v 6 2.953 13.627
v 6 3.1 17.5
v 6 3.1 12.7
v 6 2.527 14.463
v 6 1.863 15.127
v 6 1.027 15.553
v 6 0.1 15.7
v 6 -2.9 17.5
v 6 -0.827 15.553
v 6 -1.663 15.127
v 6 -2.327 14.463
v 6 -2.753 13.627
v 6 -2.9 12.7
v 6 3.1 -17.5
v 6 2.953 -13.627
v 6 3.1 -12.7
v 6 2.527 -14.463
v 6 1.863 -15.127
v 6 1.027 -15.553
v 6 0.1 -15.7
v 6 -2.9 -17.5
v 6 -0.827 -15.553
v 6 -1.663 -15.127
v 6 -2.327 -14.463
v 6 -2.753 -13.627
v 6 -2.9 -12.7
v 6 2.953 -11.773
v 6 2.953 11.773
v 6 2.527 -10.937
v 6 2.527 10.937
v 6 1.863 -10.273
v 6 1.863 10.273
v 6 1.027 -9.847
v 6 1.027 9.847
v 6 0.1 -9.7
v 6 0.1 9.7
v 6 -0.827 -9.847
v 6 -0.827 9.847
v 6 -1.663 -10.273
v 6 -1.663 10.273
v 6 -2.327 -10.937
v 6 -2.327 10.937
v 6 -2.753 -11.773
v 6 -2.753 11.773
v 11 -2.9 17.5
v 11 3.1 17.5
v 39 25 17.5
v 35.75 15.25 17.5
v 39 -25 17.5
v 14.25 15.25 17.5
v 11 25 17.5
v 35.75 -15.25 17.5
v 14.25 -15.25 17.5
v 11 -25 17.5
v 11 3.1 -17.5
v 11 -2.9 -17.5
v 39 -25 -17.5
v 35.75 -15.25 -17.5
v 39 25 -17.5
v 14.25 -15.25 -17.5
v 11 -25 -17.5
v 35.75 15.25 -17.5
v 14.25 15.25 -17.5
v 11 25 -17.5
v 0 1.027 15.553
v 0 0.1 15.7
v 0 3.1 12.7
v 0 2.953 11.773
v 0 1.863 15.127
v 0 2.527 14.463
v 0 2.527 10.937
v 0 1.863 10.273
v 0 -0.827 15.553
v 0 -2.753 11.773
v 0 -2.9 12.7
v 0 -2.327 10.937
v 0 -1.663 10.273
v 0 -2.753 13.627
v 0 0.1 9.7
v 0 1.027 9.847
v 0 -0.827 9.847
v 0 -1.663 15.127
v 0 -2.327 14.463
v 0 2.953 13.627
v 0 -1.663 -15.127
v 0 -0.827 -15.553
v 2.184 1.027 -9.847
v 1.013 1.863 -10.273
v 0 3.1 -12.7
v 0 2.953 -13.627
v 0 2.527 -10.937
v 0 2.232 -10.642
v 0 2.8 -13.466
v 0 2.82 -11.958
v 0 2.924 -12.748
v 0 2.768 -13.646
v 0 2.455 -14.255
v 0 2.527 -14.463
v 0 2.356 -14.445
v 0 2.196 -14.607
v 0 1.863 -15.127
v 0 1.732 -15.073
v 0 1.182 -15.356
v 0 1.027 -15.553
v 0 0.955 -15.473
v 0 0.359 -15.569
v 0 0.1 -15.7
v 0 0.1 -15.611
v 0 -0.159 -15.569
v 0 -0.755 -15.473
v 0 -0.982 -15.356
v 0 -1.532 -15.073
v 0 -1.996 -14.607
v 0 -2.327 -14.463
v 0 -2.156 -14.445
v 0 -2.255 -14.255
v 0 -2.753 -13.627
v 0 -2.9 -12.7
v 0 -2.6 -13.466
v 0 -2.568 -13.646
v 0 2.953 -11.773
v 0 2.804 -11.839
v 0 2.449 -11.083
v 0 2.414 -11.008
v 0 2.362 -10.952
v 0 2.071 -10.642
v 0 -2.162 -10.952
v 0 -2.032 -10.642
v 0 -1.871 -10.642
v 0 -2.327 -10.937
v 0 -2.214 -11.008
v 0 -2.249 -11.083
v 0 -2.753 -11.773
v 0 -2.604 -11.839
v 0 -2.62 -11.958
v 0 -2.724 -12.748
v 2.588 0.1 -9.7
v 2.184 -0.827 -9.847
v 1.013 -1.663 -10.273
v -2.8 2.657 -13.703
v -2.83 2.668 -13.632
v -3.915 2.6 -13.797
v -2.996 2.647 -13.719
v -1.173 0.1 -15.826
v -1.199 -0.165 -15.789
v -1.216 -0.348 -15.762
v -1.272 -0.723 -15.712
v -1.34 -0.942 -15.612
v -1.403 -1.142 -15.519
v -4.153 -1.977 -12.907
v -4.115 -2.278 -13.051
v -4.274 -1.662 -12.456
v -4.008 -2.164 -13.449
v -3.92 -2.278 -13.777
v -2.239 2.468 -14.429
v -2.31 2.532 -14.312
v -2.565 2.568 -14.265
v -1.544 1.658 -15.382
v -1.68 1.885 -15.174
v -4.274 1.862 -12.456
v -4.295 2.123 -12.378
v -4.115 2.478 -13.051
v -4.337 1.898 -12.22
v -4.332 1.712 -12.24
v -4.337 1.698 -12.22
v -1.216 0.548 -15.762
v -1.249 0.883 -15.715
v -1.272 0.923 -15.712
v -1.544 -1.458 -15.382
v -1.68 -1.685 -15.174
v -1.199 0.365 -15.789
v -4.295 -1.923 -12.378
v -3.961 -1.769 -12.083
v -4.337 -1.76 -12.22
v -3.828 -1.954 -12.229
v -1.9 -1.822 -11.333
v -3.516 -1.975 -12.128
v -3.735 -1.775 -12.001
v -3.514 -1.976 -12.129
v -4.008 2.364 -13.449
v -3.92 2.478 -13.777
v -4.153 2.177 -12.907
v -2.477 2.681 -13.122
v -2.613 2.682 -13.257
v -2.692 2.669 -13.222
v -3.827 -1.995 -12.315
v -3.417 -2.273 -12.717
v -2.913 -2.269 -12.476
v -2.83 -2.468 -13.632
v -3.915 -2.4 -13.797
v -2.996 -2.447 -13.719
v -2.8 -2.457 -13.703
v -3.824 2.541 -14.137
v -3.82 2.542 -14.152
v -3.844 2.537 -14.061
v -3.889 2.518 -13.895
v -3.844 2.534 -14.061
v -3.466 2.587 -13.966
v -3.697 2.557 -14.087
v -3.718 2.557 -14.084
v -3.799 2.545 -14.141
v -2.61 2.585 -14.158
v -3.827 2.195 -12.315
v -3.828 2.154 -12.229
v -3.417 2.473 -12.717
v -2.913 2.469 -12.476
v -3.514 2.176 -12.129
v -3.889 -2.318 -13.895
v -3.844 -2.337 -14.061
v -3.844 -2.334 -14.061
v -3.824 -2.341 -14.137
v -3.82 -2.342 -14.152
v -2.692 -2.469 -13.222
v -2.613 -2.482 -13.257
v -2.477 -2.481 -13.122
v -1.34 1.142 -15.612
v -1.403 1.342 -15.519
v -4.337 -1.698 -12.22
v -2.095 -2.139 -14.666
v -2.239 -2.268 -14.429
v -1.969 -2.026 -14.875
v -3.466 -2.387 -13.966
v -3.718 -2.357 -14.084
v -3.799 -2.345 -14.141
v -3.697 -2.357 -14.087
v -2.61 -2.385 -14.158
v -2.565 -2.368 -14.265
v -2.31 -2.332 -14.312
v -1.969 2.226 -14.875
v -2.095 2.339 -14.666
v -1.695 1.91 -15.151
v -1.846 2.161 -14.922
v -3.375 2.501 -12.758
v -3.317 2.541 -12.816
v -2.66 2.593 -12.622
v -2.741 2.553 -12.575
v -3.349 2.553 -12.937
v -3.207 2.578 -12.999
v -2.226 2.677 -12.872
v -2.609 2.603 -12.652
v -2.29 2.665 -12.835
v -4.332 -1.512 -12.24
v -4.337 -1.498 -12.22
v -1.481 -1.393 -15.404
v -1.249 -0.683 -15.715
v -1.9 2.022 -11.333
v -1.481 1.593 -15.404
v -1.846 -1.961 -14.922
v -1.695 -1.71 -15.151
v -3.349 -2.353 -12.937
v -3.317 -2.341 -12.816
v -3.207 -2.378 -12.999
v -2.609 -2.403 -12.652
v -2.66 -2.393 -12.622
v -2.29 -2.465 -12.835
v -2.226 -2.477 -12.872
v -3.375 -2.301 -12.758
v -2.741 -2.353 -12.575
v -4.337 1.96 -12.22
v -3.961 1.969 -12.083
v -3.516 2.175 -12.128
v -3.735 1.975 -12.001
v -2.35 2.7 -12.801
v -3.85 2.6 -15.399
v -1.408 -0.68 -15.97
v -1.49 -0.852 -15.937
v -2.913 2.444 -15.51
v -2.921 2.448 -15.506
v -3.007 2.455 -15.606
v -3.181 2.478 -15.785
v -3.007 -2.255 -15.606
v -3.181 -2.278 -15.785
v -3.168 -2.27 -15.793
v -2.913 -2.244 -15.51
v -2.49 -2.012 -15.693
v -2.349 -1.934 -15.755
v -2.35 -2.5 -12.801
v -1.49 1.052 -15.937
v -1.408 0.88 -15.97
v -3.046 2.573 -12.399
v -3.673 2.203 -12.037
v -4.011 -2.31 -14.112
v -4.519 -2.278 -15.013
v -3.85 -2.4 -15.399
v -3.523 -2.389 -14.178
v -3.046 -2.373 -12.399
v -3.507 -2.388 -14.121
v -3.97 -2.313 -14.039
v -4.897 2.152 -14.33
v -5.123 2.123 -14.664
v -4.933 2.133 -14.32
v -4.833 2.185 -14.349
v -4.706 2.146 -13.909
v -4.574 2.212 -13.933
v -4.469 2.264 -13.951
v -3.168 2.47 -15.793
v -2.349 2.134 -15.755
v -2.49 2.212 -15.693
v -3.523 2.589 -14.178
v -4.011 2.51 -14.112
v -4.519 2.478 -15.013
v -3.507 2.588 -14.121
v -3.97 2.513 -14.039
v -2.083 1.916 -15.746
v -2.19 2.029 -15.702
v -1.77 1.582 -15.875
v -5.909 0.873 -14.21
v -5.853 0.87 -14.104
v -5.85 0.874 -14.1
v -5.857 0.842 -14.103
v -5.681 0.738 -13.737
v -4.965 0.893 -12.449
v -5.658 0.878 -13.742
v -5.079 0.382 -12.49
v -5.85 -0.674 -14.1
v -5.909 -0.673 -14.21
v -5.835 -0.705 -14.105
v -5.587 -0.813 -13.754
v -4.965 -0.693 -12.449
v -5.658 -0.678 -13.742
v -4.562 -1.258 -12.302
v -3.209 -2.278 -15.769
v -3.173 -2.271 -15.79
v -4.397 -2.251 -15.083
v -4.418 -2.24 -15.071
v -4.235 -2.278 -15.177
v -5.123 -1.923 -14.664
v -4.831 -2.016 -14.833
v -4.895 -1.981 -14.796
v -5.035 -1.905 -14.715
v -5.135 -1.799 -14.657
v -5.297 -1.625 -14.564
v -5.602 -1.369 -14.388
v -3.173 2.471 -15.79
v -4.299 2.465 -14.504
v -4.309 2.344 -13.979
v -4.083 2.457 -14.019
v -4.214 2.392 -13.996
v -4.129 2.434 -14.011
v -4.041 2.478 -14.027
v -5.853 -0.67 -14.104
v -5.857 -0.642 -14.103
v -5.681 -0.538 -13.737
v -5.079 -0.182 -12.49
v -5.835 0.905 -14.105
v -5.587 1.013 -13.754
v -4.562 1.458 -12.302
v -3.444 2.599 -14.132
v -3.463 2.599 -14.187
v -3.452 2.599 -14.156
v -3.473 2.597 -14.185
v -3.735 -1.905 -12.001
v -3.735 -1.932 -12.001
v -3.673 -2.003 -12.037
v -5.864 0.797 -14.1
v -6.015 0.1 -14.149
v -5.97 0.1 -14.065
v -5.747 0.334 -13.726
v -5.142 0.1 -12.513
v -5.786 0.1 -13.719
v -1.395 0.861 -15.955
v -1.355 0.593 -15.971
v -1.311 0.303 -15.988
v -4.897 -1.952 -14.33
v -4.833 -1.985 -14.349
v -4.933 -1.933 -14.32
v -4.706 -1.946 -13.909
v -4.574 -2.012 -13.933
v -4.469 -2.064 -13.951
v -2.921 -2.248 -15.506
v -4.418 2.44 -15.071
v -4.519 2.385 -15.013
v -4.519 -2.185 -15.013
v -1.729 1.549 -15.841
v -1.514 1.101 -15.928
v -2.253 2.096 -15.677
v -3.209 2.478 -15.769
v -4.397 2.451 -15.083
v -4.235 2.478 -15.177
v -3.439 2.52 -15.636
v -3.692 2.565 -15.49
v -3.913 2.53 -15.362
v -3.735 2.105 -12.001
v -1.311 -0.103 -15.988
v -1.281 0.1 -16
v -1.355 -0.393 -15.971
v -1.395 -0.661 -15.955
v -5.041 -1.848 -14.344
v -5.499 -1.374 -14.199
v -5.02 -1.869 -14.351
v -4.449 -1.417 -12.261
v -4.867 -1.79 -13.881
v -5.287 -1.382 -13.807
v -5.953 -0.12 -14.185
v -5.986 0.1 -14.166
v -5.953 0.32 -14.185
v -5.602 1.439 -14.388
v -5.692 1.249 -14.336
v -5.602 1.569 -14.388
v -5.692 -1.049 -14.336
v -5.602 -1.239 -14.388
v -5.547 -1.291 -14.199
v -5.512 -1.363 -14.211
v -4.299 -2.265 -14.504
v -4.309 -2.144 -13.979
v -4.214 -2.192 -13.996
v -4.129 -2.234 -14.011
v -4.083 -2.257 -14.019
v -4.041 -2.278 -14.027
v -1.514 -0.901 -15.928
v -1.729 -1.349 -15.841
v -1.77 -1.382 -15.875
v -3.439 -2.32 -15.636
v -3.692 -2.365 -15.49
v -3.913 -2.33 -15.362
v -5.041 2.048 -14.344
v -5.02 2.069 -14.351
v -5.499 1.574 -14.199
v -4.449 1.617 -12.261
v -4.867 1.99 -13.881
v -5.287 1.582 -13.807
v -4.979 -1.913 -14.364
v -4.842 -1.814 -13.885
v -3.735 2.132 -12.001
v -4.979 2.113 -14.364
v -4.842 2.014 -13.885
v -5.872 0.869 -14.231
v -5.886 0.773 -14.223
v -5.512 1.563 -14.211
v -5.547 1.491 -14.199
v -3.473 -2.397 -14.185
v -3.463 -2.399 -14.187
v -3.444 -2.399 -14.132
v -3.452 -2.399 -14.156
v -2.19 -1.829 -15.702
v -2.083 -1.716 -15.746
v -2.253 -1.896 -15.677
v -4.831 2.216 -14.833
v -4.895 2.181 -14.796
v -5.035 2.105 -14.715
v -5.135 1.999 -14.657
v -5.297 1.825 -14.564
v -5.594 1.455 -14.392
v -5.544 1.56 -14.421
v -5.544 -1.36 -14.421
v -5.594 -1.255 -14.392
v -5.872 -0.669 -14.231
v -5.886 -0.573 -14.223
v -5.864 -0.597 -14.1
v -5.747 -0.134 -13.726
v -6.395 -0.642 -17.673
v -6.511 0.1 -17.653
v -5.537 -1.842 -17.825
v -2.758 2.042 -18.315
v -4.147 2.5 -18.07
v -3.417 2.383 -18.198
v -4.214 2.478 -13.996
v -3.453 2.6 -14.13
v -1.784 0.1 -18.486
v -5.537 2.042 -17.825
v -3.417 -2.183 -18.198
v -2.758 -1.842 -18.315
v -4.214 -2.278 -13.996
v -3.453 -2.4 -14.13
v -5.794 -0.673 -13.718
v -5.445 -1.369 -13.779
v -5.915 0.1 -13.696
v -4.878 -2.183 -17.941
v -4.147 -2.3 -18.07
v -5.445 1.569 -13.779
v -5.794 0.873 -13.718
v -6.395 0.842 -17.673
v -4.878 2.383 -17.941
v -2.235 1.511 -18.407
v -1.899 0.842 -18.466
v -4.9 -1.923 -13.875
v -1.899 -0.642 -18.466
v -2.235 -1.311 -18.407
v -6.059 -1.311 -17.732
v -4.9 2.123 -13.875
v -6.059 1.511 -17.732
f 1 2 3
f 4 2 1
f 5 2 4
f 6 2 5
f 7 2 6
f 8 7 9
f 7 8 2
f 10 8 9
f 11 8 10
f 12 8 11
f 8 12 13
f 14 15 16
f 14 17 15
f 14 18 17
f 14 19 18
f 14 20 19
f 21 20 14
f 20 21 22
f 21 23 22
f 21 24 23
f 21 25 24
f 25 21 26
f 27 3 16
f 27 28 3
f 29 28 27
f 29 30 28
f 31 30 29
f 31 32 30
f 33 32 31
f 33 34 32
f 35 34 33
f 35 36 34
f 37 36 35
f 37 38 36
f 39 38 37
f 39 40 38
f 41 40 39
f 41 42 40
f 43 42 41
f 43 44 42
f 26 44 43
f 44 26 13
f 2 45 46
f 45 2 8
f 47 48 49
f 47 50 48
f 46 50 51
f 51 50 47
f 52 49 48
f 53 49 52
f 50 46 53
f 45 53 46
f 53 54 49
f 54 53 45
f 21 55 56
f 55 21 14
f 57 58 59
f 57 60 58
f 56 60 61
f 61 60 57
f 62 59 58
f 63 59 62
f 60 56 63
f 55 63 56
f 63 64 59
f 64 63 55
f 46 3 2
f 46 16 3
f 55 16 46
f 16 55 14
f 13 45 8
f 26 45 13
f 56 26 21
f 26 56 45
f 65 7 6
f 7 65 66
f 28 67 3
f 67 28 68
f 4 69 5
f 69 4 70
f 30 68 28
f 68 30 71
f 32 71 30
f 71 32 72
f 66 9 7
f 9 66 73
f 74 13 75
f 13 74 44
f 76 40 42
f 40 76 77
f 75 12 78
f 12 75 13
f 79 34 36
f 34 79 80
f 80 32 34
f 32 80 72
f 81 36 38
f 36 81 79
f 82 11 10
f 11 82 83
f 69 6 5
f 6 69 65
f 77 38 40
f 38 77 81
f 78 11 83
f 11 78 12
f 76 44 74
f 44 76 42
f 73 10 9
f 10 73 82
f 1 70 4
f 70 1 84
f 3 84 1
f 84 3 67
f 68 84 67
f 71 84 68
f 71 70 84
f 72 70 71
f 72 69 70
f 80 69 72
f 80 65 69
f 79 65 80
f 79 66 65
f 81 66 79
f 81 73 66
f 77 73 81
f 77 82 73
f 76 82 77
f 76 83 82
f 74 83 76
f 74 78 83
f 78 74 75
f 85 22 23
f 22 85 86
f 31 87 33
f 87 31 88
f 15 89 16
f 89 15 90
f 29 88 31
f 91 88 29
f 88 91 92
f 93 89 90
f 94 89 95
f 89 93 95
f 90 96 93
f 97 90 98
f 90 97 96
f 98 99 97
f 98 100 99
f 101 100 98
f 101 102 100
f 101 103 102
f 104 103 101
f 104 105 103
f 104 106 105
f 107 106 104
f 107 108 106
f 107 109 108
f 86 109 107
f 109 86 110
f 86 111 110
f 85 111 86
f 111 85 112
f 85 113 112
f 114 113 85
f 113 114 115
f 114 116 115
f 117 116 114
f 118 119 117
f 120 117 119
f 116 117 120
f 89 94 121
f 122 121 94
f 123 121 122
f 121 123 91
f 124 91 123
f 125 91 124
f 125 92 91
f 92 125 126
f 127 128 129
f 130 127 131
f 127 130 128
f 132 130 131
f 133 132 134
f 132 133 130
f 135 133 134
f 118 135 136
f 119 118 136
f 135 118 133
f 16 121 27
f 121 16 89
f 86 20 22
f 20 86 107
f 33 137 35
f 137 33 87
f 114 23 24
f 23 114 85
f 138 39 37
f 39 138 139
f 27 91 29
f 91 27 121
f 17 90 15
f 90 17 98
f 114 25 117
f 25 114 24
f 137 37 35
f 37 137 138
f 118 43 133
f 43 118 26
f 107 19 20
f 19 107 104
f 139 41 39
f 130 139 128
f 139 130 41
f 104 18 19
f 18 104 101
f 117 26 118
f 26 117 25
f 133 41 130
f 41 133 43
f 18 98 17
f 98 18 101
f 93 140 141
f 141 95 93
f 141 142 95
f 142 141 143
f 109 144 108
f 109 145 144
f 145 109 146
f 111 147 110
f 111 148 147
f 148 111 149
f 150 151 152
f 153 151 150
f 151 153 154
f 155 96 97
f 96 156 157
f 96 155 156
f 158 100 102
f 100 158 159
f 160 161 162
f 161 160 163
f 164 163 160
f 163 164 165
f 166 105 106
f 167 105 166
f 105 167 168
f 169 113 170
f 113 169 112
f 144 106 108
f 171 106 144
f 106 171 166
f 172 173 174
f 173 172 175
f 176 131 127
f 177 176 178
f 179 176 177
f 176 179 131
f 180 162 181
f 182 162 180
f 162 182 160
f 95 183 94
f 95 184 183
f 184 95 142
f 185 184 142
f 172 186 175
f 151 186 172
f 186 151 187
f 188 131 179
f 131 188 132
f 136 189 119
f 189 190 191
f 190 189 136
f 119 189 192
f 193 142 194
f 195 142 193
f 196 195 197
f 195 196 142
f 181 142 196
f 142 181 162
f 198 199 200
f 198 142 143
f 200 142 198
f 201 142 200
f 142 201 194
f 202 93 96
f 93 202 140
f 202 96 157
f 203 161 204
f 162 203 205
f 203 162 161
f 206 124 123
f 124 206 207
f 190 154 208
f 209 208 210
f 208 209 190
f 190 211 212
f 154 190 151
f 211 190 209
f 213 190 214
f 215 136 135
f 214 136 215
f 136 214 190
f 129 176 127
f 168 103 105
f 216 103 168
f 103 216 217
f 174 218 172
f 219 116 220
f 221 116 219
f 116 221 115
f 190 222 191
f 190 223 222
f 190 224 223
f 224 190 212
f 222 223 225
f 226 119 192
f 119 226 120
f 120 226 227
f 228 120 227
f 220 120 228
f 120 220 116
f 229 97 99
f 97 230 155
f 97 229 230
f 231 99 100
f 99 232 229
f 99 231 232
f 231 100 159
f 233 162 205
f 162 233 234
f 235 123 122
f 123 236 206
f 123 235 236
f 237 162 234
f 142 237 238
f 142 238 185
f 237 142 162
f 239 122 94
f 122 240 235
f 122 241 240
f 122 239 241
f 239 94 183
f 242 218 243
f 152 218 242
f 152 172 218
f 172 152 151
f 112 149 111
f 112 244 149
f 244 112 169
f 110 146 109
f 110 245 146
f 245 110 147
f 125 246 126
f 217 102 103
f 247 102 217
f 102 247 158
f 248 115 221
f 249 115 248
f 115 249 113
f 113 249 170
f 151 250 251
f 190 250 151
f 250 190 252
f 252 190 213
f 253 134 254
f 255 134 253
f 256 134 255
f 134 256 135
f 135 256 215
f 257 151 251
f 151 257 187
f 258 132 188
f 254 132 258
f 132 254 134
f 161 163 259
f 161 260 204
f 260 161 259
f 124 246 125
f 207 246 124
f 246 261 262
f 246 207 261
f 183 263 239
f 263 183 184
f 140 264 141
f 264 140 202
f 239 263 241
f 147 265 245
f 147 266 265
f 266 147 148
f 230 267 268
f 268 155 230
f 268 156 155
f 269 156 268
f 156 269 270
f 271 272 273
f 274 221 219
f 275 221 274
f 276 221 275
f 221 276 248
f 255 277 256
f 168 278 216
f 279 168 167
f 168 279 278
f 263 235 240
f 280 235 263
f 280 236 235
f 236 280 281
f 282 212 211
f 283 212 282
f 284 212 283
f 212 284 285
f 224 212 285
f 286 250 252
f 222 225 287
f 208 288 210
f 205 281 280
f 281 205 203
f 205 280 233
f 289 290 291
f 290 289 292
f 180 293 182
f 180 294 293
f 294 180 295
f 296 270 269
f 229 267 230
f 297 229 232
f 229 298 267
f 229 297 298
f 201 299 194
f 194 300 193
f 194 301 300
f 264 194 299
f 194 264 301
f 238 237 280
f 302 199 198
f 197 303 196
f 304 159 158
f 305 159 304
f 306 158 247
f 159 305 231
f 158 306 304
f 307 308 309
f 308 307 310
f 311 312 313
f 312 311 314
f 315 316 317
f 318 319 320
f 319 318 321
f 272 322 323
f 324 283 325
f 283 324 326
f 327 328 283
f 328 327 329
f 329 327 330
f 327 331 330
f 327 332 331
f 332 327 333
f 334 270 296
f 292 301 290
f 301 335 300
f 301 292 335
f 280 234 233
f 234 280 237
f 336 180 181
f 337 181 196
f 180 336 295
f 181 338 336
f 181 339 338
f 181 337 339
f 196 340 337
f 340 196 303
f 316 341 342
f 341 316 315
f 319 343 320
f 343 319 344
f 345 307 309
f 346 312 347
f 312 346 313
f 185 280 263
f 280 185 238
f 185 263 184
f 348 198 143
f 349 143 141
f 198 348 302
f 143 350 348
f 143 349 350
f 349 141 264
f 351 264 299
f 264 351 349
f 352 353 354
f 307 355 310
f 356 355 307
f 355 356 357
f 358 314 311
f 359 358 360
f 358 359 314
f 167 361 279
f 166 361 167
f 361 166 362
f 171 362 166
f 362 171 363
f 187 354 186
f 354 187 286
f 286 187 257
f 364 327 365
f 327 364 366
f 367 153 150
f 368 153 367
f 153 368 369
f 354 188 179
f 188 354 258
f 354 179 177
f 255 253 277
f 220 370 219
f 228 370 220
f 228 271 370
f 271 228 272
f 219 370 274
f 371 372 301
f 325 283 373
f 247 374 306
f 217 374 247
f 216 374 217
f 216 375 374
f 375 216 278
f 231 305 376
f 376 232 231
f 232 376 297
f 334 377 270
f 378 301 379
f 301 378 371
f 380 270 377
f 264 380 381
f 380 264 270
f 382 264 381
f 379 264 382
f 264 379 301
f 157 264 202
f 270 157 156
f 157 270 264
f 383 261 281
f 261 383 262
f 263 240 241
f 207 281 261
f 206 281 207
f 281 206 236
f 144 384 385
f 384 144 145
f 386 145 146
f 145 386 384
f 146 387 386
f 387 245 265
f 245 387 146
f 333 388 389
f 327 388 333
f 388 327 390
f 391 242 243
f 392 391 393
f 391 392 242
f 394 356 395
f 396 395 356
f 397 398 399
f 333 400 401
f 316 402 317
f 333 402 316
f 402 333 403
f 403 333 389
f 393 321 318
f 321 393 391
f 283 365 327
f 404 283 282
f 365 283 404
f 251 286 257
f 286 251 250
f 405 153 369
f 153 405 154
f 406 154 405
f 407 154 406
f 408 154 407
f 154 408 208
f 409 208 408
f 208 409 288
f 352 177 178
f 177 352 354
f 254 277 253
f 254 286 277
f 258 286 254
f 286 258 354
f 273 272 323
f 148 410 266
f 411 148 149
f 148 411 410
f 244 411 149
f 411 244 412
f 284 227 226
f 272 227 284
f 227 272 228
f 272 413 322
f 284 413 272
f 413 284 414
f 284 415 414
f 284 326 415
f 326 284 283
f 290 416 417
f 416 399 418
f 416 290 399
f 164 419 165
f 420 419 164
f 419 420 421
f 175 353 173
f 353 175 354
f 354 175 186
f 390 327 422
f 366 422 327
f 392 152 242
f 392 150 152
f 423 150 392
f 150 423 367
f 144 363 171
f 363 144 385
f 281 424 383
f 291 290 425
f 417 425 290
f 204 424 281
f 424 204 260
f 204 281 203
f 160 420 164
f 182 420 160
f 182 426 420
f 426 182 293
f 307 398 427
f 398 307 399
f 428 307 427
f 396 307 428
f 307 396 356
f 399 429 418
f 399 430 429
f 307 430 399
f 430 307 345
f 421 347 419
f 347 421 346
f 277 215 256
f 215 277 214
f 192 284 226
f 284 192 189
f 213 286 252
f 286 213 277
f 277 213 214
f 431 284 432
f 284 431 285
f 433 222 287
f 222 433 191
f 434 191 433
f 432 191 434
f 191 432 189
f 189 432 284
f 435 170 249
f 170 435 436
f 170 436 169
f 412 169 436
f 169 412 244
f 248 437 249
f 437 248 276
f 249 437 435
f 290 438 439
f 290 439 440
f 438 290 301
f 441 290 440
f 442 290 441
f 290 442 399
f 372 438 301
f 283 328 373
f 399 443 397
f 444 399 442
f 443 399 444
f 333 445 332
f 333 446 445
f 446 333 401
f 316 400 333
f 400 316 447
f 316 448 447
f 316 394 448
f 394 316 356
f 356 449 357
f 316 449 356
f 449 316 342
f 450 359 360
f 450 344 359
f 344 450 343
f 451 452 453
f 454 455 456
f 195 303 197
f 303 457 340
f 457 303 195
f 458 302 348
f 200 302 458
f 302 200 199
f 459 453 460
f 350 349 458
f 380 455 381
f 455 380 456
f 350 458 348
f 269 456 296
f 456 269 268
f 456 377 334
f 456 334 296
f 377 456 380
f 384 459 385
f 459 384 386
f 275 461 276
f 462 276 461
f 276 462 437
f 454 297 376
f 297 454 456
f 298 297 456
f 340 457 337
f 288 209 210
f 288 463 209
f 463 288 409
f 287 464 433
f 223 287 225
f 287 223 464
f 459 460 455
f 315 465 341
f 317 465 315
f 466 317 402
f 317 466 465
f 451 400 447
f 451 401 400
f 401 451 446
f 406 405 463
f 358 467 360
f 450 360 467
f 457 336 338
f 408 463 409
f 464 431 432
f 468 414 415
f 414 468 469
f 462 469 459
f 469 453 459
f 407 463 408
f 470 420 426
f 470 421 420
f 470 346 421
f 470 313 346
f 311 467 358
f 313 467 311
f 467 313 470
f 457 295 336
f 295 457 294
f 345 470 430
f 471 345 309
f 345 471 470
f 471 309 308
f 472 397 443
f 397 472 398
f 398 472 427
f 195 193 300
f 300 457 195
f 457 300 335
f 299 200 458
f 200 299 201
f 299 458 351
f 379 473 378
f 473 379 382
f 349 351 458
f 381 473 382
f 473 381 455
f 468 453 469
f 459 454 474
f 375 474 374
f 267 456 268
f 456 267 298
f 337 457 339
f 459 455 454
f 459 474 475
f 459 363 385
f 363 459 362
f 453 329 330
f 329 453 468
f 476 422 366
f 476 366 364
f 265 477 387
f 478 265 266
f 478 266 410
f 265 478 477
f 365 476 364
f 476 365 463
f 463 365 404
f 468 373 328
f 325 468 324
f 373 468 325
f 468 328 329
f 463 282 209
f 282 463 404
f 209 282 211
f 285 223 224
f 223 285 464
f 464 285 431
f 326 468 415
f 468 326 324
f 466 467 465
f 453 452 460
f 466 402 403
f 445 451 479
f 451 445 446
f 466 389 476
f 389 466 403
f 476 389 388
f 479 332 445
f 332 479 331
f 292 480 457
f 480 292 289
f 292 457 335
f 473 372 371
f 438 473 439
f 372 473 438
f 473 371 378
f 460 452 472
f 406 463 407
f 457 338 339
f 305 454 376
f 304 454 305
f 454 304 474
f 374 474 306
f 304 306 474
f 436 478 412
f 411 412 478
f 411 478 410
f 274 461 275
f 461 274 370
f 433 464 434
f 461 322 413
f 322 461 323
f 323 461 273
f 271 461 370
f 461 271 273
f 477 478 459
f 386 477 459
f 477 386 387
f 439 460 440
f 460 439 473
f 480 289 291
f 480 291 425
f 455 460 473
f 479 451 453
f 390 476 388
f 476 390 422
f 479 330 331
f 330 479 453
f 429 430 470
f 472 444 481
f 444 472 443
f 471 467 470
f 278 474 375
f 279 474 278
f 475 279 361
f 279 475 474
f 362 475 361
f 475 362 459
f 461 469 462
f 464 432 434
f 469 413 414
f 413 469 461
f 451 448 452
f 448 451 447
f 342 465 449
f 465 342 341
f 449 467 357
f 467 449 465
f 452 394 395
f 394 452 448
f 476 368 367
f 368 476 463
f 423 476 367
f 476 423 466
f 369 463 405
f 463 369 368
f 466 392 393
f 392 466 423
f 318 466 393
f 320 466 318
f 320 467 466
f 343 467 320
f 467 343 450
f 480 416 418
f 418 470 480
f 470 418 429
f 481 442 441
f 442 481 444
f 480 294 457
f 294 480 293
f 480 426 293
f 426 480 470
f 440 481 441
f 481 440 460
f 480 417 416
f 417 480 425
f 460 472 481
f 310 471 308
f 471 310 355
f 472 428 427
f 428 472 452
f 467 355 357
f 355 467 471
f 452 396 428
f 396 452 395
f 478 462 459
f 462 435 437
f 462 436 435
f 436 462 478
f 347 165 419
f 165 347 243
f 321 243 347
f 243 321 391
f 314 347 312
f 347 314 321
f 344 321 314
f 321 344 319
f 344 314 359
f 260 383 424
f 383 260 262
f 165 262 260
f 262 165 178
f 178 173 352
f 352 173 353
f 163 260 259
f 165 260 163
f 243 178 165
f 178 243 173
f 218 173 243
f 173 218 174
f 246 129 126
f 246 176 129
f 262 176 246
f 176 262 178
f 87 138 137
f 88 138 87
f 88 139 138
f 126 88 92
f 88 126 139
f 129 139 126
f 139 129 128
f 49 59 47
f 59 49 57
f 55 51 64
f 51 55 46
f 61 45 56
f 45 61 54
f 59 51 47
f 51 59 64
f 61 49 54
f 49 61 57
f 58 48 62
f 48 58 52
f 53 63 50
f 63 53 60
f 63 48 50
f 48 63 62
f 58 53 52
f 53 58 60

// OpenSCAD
$fn=20;
rad=5.6;

//%import("/home/paul/Downloads/10mmHook.stl");
module peghookbase(thickness) {
    difference(){
        union(){

//cylinder behind hook
translate([-6 - thickness/2,0,0])rotate([90,0,0])cube([thickness,6,35], center=true);
translate([-4,-12.7,0])rotate([0,90,0])cylinder(r=3,h=8, center=true);
translate([-4,12.7,0])rotate([0,90,0])cylinder(r=3,h=8, center=true);
translate([1.5,13.15,0])rotate([0,90,15])cylinder(r1=2.9,r2=2.5,h=5, center=true);
translate([3.1,14.1,0])rotate([0,90,60])cylinder(r1=2.6,r2=2.5,h=3,center=true);
//hooks
   translate([3.8,16.1,0])rotate([0,90,80])cylinder(r1=2.5,r2=2.4,h=4,center=true);}
   rotate([0,0,20])translate([6,4,0])cube(12, center=true);}
}



//translate([0,-38.1,0])rotate([90, 180,0])peghookbase(7.5);
translate([0,0.1,0])rotate([90, 180,0])peghookbase(7.5);
//base
translate([25,0,0])difference(){
    cube([28,50,35], center=true);
    
    
translate([0,0,0]) cube([21.5,30.5,36], center = true);
/*slots
   
    translate([-10,0,0]) cube([12.6,26,36], center = true);
    #translate([10,0,0]) cube([12.6,26,36], center = true);
    translate([0,90,0]) cube([12.6,26,36], center = true);
    translate([0,-45,0]) cube([12.6,26,36], center = true);
    translate([0,-90,0]) cube([12.6,26,36], center = true);
*/
//holes
    /*translate([0,0,0])cylinder(r=rad, h=36, center=true);
    translate([0,15,0])cylinder(r=rad, h=36, center=true);
    translate([0,30,0])cylinder(r=rad, h=36, center=true);
    translate([0,-30,0])cylinder(r=rad, h=36, center=true);
    translate([0,-15,0])cylinder(r=rad, h=36, center=true);
    translate([0,45,0])cylinder(r=rad, h=36, center=true);
    translate([0,-45,0])cylinder(r=rad, h=36, center=true);
    translate([0,60,0])cylinder(r=rad, h=36, center=true);
    translate([0,-60,0])cylinder(r=rad, h=36, center=true);
    translate([0,75,0])cylinder(r=rad, h=36, center=true);
    translate([0,-75,0])cylinder(r=rad, h=36, center=true);
    */
};
